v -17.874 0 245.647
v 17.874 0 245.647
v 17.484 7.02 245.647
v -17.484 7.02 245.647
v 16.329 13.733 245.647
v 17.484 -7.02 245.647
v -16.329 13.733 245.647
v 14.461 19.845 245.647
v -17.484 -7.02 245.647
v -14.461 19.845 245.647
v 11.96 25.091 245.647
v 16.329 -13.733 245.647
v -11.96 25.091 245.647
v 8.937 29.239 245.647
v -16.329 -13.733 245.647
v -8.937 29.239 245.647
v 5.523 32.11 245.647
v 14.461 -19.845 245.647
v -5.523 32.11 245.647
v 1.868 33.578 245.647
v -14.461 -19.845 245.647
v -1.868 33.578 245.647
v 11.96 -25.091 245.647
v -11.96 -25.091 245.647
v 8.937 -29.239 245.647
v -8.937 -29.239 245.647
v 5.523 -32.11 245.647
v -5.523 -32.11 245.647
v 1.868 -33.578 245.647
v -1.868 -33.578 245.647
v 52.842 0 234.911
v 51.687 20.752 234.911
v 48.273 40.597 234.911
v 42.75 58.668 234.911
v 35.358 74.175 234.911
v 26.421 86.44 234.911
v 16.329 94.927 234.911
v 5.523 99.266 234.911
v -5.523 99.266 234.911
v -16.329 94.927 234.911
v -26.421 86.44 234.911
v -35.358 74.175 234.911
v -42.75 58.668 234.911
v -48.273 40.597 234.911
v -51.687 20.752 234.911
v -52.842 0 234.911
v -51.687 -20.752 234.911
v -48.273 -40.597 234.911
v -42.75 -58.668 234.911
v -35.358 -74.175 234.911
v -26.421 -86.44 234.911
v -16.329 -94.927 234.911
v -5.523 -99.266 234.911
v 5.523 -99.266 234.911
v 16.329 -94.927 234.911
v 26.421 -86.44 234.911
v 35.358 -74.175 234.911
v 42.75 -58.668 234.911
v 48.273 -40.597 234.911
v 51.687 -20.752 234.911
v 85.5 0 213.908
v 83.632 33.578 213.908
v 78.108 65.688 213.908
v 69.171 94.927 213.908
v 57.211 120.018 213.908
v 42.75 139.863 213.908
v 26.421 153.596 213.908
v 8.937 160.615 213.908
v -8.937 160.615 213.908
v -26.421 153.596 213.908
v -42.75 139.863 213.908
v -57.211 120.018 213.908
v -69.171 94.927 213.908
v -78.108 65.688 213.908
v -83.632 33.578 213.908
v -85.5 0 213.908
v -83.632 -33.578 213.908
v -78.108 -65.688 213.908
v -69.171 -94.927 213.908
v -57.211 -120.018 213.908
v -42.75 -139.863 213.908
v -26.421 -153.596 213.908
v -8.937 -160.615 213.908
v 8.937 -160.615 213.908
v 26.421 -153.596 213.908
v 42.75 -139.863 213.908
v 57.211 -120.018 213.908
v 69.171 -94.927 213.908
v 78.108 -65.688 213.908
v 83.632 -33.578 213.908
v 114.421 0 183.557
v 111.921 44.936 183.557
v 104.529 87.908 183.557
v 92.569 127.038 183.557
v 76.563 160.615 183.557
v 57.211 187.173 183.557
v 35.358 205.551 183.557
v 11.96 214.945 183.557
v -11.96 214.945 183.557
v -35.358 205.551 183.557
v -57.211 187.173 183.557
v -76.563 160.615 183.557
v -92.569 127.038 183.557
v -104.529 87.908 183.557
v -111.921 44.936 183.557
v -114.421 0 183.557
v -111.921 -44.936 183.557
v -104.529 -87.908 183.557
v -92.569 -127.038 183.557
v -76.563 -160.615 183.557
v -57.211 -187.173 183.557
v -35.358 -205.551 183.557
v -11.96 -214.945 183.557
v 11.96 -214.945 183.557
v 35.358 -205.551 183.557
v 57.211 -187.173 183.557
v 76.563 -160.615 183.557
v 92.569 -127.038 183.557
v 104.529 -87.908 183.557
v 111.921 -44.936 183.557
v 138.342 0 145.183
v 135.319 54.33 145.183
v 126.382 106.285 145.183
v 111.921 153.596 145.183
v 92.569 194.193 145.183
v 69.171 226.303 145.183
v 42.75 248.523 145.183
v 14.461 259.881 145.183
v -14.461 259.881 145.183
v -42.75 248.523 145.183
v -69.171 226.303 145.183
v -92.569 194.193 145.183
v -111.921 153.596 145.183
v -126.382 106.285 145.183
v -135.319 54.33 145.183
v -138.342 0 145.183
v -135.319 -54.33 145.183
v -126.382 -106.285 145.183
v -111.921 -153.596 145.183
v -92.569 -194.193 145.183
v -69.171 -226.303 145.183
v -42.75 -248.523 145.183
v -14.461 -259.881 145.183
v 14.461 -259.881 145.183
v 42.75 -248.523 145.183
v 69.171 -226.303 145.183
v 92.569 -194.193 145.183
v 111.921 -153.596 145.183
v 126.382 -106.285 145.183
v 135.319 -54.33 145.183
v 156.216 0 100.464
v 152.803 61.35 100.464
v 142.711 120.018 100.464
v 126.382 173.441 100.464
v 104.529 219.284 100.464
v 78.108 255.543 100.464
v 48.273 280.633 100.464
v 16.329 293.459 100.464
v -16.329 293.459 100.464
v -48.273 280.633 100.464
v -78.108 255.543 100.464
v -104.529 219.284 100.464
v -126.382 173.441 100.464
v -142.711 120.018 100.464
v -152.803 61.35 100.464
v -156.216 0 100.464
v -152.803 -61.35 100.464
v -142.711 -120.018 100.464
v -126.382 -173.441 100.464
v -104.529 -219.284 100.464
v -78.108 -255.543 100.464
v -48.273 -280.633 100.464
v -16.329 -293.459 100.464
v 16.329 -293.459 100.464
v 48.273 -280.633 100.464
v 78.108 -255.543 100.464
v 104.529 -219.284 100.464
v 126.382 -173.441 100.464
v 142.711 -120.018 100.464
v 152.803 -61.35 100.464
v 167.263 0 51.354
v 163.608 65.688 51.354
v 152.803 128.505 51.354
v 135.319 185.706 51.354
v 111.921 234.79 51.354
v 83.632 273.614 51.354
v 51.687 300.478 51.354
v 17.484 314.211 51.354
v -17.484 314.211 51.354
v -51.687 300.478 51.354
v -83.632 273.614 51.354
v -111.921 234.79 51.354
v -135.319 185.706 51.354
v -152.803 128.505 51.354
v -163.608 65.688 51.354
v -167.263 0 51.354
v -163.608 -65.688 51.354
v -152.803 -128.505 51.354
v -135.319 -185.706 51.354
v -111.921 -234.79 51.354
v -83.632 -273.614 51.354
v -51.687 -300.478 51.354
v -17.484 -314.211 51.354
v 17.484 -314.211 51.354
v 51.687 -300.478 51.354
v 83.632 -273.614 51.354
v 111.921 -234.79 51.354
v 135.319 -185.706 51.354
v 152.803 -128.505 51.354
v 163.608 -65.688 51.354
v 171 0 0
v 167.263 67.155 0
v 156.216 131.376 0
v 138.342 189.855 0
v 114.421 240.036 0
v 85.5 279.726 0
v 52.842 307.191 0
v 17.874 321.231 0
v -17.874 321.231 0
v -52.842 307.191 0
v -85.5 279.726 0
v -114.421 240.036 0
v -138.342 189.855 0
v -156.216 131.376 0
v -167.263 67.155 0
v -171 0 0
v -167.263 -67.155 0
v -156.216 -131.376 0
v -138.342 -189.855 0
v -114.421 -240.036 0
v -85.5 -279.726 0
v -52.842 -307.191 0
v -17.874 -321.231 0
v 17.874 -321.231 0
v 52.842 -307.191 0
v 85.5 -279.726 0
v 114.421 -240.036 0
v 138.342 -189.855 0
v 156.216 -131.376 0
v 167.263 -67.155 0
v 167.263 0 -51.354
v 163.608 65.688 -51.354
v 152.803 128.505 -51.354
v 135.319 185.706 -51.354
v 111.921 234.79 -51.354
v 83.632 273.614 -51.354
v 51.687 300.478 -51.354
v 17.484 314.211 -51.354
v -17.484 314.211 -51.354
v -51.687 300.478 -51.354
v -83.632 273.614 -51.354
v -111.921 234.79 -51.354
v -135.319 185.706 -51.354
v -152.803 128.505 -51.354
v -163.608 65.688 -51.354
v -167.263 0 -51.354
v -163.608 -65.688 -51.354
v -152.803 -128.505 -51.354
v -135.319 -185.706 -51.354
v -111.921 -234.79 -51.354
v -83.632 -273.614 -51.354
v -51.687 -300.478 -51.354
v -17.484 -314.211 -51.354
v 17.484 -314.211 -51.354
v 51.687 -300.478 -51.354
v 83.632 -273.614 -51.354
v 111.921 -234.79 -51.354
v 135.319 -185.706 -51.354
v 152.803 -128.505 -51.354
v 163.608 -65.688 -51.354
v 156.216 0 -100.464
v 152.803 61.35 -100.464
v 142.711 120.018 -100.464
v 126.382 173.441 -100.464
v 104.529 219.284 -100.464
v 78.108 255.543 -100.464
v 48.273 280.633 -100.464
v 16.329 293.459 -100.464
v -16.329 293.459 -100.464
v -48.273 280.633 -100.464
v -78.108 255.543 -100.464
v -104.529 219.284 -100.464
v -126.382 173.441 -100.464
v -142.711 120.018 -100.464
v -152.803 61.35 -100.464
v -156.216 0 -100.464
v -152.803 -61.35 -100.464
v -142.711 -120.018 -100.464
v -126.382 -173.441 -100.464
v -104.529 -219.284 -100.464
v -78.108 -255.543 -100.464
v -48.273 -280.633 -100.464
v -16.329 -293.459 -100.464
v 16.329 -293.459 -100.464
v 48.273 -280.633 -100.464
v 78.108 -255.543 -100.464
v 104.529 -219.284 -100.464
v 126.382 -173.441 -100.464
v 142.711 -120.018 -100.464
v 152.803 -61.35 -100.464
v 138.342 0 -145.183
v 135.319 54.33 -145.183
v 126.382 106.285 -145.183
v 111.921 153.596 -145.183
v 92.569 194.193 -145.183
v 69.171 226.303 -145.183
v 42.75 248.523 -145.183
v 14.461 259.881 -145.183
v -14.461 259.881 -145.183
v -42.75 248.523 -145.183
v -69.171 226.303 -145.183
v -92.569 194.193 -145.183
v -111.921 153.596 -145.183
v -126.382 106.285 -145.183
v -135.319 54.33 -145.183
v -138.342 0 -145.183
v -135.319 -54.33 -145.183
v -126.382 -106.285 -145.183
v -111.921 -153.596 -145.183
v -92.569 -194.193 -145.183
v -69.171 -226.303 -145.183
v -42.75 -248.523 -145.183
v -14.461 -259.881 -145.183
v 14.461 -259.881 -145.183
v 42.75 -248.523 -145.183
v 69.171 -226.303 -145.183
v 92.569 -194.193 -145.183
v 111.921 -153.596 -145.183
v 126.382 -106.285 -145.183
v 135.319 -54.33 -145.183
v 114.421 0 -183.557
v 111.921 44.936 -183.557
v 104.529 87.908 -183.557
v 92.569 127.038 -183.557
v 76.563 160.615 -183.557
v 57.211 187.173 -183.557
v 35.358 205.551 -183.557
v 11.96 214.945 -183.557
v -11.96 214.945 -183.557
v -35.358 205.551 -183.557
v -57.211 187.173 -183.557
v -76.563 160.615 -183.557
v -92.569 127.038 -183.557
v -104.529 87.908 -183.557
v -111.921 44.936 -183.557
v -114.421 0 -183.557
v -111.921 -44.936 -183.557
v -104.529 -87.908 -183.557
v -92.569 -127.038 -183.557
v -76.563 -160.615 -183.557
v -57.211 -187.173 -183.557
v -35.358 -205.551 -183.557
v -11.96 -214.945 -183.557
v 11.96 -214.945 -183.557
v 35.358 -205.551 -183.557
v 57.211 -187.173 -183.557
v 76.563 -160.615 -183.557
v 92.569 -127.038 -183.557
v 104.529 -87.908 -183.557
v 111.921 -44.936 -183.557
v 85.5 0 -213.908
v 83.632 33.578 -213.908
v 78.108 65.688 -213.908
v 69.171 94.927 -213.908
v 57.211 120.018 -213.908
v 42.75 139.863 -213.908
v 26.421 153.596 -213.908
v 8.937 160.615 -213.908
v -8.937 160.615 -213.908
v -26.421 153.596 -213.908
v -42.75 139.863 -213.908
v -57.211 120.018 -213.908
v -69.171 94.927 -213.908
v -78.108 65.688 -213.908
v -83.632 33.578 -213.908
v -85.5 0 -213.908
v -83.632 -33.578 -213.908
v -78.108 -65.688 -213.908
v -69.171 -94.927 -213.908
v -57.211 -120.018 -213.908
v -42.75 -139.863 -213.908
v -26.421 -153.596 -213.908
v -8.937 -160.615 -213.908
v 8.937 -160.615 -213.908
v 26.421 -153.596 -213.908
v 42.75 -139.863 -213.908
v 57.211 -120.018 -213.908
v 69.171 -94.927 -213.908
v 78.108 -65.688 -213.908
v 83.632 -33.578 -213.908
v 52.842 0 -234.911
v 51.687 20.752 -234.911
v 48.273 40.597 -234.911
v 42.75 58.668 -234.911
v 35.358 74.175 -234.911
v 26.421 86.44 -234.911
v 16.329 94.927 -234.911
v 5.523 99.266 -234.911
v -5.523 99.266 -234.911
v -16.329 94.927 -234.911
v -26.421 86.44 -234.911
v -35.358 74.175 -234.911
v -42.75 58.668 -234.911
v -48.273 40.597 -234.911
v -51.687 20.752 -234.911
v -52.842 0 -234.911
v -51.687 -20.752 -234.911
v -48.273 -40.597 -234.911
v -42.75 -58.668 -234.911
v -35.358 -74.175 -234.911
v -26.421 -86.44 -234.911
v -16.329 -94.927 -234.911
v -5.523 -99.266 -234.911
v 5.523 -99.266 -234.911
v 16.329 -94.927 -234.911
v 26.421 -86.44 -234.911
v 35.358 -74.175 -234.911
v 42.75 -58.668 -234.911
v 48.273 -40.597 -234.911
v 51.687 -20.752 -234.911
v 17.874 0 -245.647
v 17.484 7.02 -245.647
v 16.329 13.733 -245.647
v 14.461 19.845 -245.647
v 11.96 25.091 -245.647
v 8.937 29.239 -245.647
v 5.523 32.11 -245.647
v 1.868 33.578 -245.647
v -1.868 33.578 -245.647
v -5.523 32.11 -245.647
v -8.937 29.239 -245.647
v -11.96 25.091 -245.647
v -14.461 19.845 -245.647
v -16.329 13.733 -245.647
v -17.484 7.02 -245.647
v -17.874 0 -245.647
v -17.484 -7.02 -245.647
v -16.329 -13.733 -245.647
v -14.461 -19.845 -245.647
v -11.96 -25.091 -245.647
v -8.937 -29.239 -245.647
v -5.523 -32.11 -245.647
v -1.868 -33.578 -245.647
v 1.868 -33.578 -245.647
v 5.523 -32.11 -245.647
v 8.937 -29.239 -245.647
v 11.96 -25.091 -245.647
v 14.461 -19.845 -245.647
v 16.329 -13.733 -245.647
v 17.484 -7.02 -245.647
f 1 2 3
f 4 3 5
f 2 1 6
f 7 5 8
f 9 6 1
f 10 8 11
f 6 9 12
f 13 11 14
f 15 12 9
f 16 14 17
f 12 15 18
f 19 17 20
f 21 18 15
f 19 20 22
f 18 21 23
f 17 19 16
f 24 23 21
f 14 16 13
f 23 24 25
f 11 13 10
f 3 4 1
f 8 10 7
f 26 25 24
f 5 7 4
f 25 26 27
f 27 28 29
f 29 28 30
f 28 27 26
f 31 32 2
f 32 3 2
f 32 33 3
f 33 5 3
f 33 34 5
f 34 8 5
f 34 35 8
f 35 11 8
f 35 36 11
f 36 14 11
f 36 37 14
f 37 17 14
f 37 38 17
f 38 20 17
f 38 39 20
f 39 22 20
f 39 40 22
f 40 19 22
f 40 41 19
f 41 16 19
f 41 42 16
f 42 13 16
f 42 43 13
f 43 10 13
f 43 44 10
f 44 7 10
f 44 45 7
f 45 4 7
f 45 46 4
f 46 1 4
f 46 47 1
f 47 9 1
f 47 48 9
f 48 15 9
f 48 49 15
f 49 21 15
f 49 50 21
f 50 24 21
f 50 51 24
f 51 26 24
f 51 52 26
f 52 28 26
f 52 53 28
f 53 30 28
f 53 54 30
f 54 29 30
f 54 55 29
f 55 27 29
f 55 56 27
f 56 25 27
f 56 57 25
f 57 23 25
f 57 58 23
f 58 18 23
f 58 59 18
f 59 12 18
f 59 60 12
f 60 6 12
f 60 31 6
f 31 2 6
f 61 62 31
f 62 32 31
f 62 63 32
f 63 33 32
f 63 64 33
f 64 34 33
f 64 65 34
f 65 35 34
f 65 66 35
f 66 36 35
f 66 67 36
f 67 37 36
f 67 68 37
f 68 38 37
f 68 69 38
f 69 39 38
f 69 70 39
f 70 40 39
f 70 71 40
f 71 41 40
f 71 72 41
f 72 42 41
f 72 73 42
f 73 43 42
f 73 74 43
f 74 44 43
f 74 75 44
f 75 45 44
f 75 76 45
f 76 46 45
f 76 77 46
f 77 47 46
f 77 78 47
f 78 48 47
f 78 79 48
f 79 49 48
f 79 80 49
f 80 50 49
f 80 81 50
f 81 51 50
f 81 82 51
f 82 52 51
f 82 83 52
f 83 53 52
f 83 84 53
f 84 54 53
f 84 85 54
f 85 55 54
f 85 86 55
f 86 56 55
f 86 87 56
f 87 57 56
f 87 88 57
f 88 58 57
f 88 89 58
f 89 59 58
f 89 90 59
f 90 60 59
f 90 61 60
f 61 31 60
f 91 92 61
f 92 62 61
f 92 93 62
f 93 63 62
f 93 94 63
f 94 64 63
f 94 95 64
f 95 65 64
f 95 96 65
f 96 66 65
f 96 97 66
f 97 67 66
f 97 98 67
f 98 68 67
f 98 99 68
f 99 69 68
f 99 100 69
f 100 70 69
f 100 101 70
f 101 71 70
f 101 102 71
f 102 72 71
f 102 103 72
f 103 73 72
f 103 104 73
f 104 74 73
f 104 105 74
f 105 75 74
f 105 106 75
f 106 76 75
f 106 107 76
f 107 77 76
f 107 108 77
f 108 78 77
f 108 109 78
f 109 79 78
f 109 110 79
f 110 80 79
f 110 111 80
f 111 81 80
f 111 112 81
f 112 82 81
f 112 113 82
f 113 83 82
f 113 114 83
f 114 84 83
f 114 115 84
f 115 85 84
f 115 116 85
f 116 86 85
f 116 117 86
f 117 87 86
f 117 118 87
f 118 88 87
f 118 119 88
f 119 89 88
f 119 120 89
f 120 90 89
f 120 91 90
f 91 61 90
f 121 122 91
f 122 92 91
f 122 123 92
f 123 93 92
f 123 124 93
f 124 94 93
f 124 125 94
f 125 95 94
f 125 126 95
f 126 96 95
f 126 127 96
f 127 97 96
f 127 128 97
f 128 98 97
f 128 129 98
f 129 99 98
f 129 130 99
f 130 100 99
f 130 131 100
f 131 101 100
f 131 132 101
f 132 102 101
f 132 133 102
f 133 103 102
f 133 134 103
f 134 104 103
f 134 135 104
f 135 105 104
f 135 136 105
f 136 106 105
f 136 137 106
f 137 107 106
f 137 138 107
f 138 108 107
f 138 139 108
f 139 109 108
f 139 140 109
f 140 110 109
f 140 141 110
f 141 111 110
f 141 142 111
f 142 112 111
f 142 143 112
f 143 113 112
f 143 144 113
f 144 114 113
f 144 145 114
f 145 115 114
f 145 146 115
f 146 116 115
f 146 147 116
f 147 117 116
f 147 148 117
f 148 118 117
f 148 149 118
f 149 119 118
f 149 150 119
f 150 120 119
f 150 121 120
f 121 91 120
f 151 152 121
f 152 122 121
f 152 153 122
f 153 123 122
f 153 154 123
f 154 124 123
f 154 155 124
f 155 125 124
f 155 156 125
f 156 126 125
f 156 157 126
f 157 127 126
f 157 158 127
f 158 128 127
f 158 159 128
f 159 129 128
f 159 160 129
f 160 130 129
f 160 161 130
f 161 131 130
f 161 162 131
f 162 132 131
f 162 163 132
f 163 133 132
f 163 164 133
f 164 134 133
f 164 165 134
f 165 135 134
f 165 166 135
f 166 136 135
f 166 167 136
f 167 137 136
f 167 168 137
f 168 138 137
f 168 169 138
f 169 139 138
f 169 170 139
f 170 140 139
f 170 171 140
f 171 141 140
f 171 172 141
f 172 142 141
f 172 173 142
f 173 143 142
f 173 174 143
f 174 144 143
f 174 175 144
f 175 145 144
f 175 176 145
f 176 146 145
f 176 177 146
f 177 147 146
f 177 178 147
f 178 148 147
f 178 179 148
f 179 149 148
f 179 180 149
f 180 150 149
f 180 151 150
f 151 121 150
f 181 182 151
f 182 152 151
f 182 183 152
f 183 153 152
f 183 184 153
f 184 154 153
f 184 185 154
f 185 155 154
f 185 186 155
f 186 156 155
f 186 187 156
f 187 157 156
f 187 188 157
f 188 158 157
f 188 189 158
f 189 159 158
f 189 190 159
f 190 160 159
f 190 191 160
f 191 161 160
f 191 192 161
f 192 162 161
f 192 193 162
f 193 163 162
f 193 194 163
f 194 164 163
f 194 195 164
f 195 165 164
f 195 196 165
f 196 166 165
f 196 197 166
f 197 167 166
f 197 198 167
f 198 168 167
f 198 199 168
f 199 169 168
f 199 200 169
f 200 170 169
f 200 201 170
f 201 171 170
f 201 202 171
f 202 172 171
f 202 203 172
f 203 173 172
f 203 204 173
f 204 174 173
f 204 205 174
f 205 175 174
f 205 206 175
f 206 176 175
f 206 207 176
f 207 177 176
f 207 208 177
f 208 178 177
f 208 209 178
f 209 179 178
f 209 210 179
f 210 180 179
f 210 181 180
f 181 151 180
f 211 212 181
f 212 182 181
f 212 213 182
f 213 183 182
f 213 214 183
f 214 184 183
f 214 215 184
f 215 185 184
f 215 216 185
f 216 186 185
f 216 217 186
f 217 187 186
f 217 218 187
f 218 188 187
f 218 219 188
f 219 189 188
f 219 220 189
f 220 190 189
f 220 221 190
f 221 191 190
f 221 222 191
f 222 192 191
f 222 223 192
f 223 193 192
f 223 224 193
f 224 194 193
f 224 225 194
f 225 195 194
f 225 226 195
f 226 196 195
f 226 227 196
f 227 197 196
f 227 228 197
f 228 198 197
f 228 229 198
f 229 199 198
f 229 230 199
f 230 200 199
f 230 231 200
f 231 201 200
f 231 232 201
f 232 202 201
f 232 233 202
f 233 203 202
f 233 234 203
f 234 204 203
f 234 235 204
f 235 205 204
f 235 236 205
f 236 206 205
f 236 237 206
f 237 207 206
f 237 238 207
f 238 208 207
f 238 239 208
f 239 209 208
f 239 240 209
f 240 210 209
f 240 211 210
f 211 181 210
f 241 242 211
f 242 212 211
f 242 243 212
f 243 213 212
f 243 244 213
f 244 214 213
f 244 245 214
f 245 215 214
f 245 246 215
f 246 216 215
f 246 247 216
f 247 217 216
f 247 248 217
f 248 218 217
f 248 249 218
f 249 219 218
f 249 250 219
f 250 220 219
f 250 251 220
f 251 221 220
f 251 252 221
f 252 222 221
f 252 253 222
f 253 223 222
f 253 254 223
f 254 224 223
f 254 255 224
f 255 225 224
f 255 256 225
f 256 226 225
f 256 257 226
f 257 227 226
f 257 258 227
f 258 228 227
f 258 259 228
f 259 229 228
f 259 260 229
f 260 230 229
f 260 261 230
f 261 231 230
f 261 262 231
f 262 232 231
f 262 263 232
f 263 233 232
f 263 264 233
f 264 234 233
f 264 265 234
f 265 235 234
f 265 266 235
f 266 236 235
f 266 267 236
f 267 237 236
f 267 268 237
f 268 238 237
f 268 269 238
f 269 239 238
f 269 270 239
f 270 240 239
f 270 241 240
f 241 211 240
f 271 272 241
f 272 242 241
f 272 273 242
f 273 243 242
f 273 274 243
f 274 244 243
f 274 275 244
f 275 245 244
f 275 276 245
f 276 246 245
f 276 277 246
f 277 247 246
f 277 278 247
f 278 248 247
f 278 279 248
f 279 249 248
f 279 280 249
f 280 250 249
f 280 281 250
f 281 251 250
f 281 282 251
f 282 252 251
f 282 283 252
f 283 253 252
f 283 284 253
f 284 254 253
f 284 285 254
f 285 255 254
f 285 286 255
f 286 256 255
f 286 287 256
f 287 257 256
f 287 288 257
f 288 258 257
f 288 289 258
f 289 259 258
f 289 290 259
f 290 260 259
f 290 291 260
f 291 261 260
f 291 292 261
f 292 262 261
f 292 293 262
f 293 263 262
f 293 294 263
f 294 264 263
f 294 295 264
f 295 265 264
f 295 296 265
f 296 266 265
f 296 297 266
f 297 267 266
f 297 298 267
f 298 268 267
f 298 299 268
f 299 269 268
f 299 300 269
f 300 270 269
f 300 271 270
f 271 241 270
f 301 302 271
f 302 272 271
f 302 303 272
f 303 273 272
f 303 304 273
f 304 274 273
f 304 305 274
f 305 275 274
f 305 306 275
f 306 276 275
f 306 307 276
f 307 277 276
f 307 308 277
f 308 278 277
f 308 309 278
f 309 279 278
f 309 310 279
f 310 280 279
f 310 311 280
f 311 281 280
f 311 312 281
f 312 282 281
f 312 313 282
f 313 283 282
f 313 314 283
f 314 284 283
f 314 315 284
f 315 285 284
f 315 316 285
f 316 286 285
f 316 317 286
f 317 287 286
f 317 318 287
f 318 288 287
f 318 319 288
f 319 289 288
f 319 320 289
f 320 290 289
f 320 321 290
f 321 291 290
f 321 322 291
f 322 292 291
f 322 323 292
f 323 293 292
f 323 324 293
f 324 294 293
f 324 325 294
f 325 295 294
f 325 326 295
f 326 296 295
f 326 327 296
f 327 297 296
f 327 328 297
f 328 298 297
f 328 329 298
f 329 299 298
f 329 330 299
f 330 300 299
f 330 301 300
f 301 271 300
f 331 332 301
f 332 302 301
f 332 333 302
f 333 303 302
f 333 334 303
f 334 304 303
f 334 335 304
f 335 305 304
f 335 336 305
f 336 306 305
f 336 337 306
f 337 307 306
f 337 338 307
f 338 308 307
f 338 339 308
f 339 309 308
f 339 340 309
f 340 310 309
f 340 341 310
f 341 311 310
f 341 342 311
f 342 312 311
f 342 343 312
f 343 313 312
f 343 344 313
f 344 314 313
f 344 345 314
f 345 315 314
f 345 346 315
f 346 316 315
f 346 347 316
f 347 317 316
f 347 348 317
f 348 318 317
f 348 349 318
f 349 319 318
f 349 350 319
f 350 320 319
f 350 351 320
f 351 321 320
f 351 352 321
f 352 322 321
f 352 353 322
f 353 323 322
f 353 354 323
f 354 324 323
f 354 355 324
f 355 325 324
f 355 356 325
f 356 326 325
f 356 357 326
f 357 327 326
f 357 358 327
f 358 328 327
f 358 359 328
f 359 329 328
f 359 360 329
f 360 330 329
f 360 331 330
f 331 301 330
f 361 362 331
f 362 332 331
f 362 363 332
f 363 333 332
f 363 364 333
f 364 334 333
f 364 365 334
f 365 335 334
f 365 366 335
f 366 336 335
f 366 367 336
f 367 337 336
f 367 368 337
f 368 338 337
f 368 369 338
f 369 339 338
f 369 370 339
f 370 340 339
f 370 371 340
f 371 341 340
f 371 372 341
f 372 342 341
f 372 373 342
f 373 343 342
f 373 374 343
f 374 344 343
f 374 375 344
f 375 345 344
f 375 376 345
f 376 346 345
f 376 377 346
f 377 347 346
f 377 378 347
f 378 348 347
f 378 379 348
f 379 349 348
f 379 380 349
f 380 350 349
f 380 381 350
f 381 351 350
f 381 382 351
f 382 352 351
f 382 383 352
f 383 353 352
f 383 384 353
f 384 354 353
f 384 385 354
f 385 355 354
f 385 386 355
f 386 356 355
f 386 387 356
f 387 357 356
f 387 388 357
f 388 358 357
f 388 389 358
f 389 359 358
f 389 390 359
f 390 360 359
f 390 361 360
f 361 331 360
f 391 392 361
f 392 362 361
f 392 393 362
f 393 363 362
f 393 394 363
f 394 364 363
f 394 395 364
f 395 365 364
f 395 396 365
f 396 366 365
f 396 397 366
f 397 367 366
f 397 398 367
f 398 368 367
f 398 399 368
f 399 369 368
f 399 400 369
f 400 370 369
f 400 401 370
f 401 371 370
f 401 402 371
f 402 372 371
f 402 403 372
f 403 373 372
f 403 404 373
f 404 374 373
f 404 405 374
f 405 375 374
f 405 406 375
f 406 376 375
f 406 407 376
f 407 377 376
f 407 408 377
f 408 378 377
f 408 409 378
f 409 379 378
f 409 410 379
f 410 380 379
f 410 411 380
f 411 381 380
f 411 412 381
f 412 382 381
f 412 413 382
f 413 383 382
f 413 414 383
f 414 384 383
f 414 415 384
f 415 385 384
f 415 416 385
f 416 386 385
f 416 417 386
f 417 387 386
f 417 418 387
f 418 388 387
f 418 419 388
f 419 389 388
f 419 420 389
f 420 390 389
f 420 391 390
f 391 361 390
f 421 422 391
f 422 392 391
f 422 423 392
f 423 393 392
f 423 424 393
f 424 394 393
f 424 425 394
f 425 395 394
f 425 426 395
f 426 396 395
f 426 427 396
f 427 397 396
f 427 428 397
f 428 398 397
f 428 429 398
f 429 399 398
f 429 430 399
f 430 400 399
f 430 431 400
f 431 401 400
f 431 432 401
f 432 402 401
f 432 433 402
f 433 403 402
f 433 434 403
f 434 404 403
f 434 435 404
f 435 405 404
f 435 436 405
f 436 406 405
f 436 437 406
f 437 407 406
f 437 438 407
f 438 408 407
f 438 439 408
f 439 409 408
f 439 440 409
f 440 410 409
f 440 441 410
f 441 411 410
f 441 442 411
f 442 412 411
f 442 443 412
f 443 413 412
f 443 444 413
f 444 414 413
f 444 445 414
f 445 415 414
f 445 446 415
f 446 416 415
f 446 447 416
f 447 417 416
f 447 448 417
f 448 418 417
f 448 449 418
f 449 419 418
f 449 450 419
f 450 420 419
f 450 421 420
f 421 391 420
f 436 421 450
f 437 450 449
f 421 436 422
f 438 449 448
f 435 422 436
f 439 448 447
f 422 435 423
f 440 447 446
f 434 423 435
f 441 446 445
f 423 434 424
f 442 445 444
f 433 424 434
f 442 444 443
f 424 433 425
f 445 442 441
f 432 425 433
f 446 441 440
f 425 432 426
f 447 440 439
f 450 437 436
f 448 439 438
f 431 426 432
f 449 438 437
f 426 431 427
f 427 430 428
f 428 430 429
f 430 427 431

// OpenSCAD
// Generated by SolidPython 1.0.1 on 2020-07-29 00:46:49


scale(v = [9, 17, 13]) {
	sphere(r = 19);
}
/***********************************************
*********      SolidPython code:      **********
************************************************
 
# import packages: SolidPython
from solid import *
from solid.utils import *
from itertools import chain, combinations, permutations


class Resize:

    def __init__(self, scad_file):
        self.scad_file = scad_file
        #self.scad_file = import_scad(scad_file)
        # cone/cylinder param:
        self.r1 = 0
        self.r2 = 0
        self.h = 0
        # rectangular prism param:
        self.w = 0
        self.l = 0
        # ellipse param:
        self.r = 0

    # import OpenScad code (file name corresponds to shape)


    # classify shape + parameters
    def assign(self, param1, param2, param3):
        if self.scad_file == 'cone.scad':
            self.r1 = param1
            self.r2 = param2
            self.h = param3
        elif self.scad_file == 'cylinder.scad':
            self.r1 = param1
            self.r2 = param2
            self.h = param3
        elif self.scad_file == 'rectangularPrism.scad':
            self.h = param1
            self.l = param2
            self.w = param3
        else:
            self.r = param1
            self.h = param2

    # resize parameters
    def iterate(self):
        x = range(3, 20, 2)
        i = 1
        if self.scad_file == 'cone.scad':
            tempList = list(permutations(x, 2))
            for temp in tempList:
                param1 = temp[0]
                param2 = temp[1]
                filepath = 'produced_scad_files/' + 'cone' + str(param1) + '_' + str(param2) + '_' + '.scad'
                scad_render_to_file(cylinder(h=param1, r1=param2, r2=0), filepath)

        elif self.scad_file == 'cylinder.scad':
            tempList = list(permutations(x, 3))
            for temp in tempList:
                param1 = temp[0]
                param2 = temp[1]
                filepath = 'produced_scad_files/' + 'cylinder' + str(param1) + '_' + str(param2) + '_' + '.scad'
                scad_render_to_file(cylinder(h=param1, r1=param2, r2=param2), filepath)

        elif self.scad_file == 'rectangularPrism.scad':
            tempList = list(permutations(x, 3))
            for temp in tempList:
                param1 = temp[0]
                param2 = temp[1]
                param3 = temp[2]
                filepath = 'produced_scad_files/' + 'rectangularPrism' + str(param1) + '_' + str(param2) + '_' + str(
                    param3) + '.scad'
                scad_render_to_file(cube(size=(param1, param2, param3)), filepath)

        elif self.scad_file == 'ellipse.scad':
            tempList = list(permutations(x, 4))
            for temp in tempList:
                param1 = temp[0]
                param2 = temp[1]
                param3 = temp[2]
                param4 = temp[3]
                filepath = 'produced_scad_files/' + 'ellipse' + str(param1) + '_' + str(param2) + '_' + str(param3) + '_' + str(param4) + '.scad'
                scad_render_to_file(scale([param1, param2, param3])(sphere(r=param4)), filepath)

    def render_to_scadfile(self):
        scad_render_to_file(scad, 'example.scad') 
 
************************************************/
